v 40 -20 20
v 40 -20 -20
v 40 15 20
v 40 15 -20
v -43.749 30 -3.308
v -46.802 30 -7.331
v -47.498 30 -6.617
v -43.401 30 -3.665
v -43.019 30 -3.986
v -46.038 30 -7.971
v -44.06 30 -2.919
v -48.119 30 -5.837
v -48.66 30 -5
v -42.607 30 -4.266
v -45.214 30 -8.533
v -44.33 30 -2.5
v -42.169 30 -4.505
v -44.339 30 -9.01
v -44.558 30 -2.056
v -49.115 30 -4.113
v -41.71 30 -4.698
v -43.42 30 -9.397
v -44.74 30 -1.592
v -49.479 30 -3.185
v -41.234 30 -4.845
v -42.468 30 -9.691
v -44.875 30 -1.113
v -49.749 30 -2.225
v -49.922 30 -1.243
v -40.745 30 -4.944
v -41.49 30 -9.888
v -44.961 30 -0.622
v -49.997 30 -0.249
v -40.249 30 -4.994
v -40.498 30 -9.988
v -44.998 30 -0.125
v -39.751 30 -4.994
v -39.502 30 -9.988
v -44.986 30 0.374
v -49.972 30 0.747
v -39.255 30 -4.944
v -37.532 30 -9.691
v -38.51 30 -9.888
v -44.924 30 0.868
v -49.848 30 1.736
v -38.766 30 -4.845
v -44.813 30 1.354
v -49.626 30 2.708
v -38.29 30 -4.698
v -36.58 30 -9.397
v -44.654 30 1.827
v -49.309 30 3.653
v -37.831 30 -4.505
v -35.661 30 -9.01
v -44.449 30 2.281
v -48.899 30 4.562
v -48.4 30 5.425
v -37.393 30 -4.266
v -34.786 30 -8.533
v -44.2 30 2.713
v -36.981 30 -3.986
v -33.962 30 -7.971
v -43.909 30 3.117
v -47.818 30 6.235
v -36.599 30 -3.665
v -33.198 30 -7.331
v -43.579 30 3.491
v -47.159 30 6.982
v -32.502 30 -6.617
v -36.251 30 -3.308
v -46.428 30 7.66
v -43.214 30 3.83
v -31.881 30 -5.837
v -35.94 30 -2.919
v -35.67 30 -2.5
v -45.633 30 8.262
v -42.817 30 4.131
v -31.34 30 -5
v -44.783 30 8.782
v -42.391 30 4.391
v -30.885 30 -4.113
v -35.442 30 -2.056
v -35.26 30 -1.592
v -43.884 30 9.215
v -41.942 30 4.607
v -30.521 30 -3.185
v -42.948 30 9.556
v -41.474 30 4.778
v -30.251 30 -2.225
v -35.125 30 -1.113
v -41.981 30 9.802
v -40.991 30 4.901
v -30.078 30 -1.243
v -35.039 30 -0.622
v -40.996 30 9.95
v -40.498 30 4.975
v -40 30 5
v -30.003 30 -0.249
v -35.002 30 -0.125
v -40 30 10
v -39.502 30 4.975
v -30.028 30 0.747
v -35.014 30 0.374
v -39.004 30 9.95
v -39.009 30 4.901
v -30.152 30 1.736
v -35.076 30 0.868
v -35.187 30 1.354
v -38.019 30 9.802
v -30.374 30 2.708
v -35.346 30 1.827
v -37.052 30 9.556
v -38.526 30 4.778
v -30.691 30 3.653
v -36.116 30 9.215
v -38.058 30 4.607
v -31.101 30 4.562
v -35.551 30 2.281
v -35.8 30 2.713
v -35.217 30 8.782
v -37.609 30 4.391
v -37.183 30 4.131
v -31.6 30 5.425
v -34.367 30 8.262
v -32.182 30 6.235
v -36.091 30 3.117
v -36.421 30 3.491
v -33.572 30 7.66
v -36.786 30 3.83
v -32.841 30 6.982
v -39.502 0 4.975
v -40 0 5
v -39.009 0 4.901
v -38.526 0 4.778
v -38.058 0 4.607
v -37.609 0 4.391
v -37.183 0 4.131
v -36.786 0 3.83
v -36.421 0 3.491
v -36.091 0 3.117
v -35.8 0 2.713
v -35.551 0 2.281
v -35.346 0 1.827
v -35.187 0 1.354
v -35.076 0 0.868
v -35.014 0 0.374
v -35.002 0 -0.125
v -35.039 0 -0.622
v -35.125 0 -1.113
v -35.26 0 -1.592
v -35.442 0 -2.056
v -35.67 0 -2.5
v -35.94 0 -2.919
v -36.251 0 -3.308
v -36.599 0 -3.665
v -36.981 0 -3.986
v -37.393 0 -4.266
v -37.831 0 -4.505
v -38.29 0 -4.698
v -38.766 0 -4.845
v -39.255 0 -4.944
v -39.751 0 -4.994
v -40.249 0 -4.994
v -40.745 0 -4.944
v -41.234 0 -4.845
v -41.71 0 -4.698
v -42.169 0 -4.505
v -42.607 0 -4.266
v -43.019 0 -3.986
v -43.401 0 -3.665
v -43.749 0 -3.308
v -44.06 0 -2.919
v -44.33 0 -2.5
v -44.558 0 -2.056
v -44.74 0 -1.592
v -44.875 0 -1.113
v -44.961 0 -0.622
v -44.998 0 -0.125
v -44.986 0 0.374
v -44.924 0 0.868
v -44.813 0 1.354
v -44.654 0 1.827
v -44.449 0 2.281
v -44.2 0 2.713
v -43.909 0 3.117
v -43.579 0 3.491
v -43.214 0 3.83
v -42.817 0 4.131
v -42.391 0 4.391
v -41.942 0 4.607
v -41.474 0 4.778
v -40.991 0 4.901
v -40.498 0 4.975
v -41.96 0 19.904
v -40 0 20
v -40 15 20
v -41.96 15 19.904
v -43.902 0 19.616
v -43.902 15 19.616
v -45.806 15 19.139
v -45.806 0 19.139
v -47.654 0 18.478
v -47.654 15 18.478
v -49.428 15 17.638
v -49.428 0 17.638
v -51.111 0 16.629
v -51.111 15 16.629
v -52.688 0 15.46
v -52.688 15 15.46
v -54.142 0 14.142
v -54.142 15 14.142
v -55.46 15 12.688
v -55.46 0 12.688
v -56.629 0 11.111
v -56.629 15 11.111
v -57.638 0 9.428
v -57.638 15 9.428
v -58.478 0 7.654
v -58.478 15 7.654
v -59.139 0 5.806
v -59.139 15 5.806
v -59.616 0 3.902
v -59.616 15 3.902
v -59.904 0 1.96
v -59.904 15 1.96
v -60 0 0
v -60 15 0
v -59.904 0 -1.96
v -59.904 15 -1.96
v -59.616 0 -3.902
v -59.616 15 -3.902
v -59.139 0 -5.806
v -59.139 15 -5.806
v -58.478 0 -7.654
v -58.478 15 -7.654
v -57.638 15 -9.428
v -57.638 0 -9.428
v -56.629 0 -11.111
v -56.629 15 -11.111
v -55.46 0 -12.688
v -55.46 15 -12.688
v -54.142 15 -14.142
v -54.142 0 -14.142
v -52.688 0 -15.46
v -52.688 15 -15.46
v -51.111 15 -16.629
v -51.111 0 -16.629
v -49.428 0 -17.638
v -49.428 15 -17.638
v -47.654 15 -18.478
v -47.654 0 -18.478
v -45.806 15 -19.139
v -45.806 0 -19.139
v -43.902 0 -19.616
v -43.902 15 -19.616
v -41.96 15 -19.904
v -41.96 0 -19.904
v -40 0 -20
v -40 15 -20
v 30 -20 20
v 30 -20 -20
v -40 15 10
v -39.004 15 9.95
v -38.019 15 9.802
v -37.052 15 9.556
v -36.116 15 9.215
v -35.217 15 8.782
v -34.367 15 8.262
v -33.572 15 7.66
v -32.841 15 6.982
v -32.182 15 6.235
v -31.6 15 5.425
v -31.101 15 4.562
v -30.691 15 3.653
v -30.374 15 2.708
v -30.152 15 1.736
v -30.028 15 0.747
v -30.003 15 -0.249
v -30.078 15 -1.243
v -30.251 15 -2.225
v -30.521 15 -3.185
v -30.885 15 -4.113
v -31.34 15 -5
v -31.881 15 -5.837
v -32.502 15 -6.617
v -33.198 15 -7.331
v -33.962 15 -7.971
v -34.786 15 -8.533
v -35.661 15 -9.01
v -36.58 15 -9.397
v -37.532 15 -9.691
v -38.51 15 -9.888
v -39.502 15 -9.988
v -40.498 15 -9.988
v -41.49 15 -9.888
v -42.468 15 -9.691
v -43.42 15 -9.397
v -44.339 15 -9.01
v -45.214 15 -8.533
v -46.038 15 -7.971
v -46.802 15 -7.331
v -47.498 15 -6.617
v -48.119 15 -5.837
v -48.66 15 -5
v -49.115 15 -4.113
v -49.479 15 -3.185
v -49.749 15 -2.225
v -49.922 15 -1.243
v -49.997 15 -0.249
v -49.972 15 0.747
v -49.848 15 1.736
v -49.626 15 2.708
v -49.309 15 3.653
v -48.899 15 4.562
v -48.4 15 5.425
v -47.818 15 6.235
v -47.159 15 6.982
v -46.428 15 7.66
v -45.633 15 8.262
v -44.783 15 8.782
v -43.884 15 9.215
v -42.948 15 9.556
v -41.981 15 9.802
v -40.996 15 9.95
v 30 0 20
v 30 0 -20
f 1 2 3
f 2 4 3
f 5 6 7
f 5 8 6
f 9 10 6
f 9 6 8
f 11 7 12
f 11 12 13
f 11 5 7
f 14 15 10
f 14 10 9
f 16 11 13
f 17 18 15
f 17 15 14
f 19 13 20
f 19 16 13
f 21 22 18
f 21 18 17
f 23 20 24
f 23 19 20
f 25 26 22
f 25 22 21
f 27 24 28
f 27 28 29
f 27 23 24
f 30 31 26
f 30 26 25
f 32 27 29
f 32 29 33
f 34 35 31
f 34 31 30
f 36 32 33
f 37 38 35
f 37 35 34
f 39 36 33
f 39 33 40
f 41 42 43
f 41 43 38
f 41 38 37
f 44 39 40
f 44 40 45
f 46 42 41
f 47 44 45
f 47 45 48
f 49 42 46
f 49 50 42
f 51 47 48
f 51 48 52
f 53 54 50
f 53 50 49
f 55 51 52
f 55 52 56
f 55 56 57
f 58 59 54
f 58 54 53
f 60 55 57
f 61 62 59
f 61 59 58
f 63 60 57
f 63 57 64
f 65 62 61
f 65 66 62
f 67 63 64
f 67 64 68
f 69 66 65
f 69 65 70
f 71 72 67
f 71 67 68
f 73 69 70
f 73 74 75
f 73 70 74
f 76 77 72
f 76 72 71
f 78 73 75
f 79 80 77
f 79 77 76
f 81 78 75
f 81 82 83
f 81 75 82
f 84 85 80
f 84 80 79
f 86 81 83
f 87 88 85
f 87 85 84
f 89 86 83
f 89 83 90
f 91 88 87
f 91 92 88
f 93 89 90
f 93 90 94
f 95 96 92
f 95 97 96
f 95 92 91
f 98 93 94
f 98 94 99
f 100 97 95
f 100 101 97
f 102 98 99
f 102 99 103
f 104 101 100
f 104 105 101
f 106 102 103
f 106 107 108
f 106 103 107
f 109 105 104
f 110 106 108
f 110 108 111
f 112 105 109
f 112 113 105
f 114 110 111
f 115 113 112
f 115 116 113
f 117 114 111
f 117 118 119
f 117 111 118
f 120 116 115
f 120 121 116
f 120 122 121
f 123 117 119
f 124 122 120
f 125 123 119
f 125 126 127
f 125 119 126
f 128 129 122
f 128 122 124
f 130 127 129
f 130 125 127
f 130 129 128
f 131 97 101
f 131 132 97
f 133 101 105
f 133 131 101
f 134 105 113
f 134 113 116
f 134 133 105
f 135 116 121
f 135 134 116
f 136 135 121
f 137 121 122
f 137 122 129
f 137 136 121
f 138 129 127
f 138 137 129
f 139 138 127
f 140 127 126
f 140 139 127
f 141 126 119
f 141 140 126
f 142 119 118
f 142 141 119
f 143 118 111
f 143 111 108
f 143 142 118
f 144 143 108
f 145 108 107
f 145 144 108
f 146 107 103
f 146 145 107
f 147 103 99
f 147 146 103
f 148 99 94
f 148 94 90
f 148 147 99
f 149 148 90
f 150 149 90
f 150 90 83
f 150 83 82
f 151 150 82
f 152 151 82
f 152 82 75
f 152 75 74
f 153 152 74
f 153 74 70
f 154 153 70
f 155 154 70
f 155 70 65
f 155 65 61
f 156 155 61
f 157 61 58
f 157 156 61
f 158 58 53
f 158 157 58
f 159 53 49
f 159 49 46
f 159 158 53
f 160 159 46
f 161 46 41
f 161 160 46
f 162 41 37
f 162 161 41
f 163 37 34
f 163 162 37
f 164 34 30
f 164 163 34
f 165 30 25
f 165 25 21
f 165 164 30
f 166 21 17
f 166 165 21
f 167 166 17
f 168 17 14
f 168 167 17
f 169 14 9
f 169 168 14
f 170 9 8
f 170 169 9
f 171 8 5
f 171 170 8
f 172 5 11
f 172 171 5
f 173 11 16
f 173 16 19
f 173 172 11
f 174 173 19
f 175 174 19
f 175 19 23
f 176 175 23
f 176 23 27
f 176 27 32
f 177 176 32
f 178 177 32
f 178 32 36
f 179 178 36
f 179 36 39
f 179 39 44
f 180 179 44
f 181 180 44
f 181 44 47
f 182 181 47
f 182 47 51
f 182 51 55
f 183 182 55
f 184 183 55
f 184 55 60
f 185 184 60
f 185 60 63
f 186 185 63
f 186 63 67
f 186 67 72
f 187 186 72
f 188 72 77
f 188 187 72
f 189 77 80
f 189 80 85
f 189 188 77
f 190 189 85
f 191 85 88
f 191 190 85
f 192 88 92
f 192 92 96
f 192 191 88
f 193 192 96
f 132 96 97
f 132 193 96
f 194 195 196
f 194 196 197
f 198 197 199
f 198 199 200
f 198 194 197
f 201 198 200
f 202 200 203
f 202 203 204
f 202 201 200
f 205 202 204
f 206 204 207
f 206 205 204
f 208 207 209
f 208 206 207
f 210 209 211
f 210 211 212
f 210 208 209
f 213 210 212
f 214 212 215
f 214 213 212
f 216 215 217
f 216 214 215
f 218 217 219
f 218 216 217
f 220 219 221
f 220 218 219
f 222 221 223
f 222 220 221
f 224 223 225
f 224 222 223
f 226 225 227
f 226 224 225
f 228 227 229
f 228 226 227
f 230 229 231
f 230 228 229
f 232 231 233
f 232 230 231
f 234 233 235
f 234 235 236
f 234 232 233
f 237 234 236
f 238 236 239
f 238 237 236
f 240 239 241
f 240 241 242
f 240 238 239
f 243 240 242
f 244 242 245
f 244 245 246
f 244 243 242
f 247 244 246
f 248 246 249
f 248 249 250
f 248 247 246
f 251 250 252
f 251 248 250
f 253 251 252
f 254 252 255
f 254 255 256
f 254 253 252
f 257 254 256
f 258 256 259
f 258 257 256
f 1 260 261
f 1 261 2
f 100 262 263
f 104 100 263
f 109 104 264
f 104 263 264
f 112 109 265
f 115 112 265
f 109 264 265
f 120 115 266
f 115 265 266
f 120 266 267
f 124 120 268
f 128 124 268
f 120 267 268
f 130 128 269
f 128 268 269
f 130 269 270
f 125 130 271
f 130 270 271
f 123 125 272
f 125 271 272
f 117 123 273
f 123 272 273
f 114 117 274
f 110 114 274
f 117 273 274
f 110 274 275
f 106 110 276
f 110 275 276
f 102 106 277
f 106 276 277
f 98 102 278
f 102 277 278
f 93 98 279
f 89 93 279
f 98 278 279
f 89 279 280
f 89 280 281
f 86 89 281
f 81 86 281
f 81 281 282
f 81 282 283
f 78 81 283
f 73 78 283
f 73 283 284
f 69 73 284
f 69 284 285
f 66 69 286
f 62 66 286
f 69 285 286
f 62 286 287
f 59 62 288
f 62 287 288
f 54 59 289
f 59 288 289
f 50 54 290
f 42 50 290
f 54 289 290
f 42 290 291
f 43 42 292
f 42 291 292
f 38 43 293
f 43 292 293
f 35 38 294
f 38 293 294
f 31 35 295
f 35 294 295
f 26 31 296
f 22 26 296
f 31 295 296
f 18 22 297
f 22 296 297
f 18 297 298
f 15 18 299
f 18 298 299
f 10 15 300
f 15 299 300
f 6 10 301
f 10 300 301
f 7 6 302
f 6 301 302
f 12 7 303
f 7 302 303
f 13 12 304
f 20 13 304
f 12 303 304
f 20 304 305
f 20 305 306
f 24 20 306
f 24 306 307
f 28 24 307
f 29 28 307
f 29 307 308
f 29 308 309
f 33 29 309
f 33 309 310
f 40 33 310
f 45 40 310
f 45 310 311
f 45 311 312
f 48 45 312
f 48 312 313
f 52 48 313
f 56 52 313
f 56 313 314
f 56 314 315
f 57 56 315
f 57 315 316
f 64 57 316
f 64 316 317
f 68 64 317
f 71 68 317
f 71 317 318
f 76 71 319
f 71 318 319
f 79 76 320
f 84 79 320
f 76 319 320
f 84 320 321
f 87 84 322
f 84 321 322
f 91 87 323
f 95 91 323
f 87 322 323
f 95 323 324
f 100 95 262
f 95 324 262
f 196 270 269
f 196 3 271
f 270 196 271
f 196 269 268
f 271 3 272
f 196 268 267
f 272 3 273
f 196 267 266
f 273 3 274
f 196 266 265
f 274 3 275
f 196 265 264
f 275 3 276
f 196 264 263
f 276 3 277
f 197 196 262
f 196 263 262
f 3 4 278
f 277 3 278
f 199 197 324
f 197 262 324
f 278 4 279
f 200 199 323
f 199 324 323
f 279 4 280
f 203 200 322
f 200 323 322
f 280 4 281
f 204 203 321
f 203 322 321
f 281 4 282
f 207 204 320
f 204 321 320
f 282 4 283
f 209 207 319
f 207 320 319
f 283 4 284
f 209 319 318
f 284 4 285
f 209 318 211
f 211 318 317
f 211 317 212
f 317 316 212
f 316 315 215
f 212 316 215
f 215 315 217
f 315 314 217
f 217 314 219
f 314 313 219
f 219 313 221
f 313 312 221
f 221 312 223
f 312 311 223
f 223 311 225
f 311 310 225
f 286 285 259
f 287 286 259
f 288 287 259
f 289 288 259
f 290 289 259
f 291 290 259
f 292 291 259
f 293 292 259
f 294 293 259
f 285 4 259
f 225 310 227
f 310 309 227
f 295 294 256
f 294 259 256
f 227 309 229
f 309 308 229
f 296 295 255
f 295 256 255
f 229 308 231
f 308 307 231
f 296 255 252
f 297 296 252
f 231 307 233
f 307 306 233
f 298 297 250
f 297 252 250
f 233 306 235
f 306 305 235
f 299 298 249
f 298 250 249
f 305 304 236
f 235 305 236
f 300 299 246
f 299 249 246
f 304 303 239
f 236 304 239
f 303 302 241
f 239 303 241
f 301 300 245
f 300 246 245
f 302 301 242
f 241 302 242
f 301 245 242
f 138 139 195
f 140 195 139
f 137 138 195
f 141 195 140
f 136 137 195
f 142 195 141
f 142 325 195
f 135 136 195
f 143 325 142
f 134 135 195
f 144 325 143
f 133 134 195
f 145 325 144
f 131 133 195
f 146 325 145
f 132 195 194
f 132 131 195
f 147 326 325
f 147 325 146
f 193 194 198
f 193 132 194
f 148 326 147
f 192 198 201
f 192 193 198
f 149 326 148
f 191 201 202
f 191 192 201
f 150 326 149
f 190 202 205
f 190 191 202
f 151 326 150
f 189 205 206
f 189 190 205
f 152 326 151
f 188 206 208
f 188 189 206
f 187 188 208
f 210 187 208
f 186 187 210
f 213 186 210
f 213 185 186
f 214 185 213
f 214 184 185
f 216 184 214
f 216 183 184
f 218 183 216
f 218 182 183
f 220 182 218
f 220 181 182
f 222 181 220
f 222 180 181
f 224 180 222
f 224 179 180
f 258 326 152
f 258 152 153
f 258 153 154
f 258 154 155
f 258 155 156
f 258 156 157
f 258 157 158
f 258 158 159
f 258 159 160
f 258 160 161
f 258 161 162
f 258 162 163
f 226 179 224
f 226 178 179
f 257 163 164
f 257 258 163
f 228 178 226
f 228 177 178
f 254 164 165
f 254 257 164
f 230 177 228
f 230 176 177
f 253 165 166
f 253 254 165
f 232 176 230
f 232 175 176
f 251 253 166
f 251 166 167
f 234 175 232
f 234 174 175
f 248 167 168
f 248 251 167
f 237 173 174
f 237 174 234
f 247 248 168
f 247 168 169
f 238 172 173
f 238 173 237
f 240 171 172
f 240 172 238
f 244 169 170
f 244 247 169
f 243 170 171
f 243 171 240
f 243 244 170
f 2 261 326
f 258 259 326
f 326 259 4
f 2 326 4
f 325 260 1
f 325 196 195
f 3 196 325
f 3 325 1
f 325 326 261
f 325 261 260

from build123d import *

# Parameters (mm, degrees)
CROQUIS2_R              = 5
SALIENTE_EXTRUIR1_DEPTH = 15
CROQUIS3_R              = 10
CROQUIS3_R_2            = 5
SALIENTE_EXTRUIR2_DEPTH = 15
CROQUIS4_W              = 10
CROQUIS4_H              = 40
SALIENTE_EXTRUIR3_DEPTH = 20


with BuildPart() as part:
    # Croquis2 → Saliente-Extruir1 (new body)
    with BuildSketch(Plane(origin=(0, 0, 0), x_dir=(1, 0, 0), z_dir=(0, 1, 0))):
        with BuildLine():
            Line((-40, 20), (40, 20))
            Line((40, 20), (40, -20))
            Line((40, -20), (-40, -20))
            ThreePointArc((-40, -20), (-60, 0), (-40, 20))
        make_face()
        with Locations(Location((-40, 0, 0), (0, 0, 270))):
            Circle(CROQUIS2_R, mode=Mode.SUBTRACT)
    extrude(amount=SALIENTE_EXTRUIR1_DEPTH)

    # Croquis3 → Saliente-Extruir2 (add)
    with BuildSketch(Plane(origin=(0, 15, 0), x_dir=(1, 0, 0), z_dir=(0, 1, 0))):
        with Locations(Location((-40, 0, 0), (0, 0, 270))):
            Circle(CROQUIS3_R)
        with Locations(Location((-40, 0, 0), (0, 0, 270))):
            Circle(CROQUIS3_R_2, mode=Mode.SUBTRACT)
    extrude(amount=SALIENTE_EXTRUIR2_DEPTH)

    # Croquis4 → Saliente-Extruir3 (add)
    with BuildSketch(Plane.XZ):
        with Locations((35, 0)):
            Rectangle(CROQUIS4_W, CROQUIS4_H)
    extrude(amount=SALIENTE_EXTRUIR3_DEPTH)


solid = part.part
